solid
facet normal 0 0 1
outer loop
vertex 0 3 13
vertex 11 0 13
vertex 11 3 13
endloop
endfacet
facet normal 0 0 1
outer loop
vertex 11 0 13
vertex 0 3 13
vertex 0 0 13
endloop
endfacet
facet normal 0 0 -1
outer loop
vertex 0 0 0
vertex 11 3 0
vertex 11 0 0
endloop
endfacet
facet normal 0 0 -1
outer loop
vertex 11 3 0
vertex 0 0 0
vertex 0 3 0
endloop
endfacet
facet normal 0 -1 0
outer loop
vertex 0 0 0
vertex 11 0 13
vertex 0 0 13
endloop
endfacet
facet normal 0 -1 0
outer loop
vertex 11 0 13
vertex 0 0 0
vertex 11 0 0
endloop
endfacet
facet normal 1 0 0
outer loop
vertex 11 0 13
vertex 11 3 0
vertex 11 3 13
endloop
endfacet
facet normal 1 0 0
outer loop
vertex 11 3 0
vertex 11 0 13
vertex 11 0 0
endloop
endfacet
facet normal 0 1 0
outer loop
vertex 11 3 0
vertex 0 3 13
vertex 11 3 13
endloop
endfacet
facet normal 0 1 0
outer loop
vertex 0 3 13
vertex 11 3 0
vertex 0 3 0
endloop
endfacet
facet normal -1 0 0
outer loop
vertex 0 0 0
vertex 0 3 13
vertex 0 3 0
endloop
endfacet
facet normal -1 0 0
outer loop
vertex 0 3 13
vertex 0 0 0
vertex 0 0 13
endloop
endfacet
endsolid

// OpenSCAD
// Generated by SolidPython 1.0.1 on 2020-07-29 00:46:55


cube(size = [11, 3, 13]);
/***********************************************
*********      SolidPython code:      **********
************************************************
 
# import packages: SolidPython
from solid import *
from solid.utils import *
from itertools import chain, combinations, permutations


class Resize:

    def __init__(self, scad_file):
        self.scad_file = scad_file
        #self.scad_file = import_scad(scad_file)
        # cone/cylinder param:
        self.r1 = 0
        self.r2 = 0
        self.h = 0
        # rectangular prism param:
        self.w = 0
        self.l = 0
        # ellipse param:
        self.r = 0

    # import OpenScad code (file name corresponds to shape)


    # classify shape + parameters
    def assign(self, param1, param2, param3):
        if self.scad_file == 'cone.scad':
            self.r1 = param1
            self.r2 = param2
            self.h = param3
        elif self.scad_file == 'cylinder.scad':
            self.r1 = param1
            self.r2 = param2
            self.h = param3
        elif self.scad_file == 'rectangularPrism.scad':
            self.h = param1
            self.l = param2
            self.w = param3
        else:
            self.r = param1
            self.h = param2

    # resize parameters
    def iterate(self):
        x = range(3, 20, 2)
        i = 1
        if self.scad_file == 'cone.scad':
            tempList = list(permutations(x, 2))
            for temp in tempList:
                param1 = temp[0]
                param2 = temp[1]
                filepath = 'produced_scad_files/' + 'cone' + str(param1) + '_' + str(param2) + '_' + '.scad'
                scad_render_to_file(cylinder(h=param1, r1=param2, r2=0), filepath)

        elif self.scad_file == 'cylinder.scad':
            tempList = list(permutations(x, 3))
            for temp in tempList:
                param1 = temp[0]
                param2 = temp[1]
                filepath = 'produced_scad_files/' + 'cylinder' + str(param1) + '_' + str(param2) + '_' + '.scad'
                scad_render_to_file(cylinder(h=param1, r1=param2, r2=param2), filepath)

        elif self.scad_file == 'rectangularPrism.scad':
            tempList = list(permutations(x, 3))
            for temp in tempList:
                param1 = temp[0]
                param2 = temp[1]
                param3 = temp[2]
                filepath = 'produced_scad_files/' + 'rectangularPrism' + str(param1) + '_' + str(param2) + '_' + str(
                    param3) + '.scad'
                scad_render_to_file(cube(size=(param1, param2, param3)), filepath)

        elif self.scad_file == 'ellipse.scad':
            tempList = list(permutations(x, 4))
            for temp in tempList:
                param1 = temp[0]
                param2 = temp[1]
                param3 = temp[2]
                param4 = temp[3]
                filepath = 'produced_scad_files/' + 'ellipse' + str(param1) + '_' + str(param2) + '_' + str(param3) + '_' + str(param4) + '.scad'
                scad_render_to_file(scale([param1, param2, param3])(sphere(r=param4)), filepath)

    def render_to_scadfile(self):
        scad_render_to_file(scad, 'example.scad') 
 
************************************************/
